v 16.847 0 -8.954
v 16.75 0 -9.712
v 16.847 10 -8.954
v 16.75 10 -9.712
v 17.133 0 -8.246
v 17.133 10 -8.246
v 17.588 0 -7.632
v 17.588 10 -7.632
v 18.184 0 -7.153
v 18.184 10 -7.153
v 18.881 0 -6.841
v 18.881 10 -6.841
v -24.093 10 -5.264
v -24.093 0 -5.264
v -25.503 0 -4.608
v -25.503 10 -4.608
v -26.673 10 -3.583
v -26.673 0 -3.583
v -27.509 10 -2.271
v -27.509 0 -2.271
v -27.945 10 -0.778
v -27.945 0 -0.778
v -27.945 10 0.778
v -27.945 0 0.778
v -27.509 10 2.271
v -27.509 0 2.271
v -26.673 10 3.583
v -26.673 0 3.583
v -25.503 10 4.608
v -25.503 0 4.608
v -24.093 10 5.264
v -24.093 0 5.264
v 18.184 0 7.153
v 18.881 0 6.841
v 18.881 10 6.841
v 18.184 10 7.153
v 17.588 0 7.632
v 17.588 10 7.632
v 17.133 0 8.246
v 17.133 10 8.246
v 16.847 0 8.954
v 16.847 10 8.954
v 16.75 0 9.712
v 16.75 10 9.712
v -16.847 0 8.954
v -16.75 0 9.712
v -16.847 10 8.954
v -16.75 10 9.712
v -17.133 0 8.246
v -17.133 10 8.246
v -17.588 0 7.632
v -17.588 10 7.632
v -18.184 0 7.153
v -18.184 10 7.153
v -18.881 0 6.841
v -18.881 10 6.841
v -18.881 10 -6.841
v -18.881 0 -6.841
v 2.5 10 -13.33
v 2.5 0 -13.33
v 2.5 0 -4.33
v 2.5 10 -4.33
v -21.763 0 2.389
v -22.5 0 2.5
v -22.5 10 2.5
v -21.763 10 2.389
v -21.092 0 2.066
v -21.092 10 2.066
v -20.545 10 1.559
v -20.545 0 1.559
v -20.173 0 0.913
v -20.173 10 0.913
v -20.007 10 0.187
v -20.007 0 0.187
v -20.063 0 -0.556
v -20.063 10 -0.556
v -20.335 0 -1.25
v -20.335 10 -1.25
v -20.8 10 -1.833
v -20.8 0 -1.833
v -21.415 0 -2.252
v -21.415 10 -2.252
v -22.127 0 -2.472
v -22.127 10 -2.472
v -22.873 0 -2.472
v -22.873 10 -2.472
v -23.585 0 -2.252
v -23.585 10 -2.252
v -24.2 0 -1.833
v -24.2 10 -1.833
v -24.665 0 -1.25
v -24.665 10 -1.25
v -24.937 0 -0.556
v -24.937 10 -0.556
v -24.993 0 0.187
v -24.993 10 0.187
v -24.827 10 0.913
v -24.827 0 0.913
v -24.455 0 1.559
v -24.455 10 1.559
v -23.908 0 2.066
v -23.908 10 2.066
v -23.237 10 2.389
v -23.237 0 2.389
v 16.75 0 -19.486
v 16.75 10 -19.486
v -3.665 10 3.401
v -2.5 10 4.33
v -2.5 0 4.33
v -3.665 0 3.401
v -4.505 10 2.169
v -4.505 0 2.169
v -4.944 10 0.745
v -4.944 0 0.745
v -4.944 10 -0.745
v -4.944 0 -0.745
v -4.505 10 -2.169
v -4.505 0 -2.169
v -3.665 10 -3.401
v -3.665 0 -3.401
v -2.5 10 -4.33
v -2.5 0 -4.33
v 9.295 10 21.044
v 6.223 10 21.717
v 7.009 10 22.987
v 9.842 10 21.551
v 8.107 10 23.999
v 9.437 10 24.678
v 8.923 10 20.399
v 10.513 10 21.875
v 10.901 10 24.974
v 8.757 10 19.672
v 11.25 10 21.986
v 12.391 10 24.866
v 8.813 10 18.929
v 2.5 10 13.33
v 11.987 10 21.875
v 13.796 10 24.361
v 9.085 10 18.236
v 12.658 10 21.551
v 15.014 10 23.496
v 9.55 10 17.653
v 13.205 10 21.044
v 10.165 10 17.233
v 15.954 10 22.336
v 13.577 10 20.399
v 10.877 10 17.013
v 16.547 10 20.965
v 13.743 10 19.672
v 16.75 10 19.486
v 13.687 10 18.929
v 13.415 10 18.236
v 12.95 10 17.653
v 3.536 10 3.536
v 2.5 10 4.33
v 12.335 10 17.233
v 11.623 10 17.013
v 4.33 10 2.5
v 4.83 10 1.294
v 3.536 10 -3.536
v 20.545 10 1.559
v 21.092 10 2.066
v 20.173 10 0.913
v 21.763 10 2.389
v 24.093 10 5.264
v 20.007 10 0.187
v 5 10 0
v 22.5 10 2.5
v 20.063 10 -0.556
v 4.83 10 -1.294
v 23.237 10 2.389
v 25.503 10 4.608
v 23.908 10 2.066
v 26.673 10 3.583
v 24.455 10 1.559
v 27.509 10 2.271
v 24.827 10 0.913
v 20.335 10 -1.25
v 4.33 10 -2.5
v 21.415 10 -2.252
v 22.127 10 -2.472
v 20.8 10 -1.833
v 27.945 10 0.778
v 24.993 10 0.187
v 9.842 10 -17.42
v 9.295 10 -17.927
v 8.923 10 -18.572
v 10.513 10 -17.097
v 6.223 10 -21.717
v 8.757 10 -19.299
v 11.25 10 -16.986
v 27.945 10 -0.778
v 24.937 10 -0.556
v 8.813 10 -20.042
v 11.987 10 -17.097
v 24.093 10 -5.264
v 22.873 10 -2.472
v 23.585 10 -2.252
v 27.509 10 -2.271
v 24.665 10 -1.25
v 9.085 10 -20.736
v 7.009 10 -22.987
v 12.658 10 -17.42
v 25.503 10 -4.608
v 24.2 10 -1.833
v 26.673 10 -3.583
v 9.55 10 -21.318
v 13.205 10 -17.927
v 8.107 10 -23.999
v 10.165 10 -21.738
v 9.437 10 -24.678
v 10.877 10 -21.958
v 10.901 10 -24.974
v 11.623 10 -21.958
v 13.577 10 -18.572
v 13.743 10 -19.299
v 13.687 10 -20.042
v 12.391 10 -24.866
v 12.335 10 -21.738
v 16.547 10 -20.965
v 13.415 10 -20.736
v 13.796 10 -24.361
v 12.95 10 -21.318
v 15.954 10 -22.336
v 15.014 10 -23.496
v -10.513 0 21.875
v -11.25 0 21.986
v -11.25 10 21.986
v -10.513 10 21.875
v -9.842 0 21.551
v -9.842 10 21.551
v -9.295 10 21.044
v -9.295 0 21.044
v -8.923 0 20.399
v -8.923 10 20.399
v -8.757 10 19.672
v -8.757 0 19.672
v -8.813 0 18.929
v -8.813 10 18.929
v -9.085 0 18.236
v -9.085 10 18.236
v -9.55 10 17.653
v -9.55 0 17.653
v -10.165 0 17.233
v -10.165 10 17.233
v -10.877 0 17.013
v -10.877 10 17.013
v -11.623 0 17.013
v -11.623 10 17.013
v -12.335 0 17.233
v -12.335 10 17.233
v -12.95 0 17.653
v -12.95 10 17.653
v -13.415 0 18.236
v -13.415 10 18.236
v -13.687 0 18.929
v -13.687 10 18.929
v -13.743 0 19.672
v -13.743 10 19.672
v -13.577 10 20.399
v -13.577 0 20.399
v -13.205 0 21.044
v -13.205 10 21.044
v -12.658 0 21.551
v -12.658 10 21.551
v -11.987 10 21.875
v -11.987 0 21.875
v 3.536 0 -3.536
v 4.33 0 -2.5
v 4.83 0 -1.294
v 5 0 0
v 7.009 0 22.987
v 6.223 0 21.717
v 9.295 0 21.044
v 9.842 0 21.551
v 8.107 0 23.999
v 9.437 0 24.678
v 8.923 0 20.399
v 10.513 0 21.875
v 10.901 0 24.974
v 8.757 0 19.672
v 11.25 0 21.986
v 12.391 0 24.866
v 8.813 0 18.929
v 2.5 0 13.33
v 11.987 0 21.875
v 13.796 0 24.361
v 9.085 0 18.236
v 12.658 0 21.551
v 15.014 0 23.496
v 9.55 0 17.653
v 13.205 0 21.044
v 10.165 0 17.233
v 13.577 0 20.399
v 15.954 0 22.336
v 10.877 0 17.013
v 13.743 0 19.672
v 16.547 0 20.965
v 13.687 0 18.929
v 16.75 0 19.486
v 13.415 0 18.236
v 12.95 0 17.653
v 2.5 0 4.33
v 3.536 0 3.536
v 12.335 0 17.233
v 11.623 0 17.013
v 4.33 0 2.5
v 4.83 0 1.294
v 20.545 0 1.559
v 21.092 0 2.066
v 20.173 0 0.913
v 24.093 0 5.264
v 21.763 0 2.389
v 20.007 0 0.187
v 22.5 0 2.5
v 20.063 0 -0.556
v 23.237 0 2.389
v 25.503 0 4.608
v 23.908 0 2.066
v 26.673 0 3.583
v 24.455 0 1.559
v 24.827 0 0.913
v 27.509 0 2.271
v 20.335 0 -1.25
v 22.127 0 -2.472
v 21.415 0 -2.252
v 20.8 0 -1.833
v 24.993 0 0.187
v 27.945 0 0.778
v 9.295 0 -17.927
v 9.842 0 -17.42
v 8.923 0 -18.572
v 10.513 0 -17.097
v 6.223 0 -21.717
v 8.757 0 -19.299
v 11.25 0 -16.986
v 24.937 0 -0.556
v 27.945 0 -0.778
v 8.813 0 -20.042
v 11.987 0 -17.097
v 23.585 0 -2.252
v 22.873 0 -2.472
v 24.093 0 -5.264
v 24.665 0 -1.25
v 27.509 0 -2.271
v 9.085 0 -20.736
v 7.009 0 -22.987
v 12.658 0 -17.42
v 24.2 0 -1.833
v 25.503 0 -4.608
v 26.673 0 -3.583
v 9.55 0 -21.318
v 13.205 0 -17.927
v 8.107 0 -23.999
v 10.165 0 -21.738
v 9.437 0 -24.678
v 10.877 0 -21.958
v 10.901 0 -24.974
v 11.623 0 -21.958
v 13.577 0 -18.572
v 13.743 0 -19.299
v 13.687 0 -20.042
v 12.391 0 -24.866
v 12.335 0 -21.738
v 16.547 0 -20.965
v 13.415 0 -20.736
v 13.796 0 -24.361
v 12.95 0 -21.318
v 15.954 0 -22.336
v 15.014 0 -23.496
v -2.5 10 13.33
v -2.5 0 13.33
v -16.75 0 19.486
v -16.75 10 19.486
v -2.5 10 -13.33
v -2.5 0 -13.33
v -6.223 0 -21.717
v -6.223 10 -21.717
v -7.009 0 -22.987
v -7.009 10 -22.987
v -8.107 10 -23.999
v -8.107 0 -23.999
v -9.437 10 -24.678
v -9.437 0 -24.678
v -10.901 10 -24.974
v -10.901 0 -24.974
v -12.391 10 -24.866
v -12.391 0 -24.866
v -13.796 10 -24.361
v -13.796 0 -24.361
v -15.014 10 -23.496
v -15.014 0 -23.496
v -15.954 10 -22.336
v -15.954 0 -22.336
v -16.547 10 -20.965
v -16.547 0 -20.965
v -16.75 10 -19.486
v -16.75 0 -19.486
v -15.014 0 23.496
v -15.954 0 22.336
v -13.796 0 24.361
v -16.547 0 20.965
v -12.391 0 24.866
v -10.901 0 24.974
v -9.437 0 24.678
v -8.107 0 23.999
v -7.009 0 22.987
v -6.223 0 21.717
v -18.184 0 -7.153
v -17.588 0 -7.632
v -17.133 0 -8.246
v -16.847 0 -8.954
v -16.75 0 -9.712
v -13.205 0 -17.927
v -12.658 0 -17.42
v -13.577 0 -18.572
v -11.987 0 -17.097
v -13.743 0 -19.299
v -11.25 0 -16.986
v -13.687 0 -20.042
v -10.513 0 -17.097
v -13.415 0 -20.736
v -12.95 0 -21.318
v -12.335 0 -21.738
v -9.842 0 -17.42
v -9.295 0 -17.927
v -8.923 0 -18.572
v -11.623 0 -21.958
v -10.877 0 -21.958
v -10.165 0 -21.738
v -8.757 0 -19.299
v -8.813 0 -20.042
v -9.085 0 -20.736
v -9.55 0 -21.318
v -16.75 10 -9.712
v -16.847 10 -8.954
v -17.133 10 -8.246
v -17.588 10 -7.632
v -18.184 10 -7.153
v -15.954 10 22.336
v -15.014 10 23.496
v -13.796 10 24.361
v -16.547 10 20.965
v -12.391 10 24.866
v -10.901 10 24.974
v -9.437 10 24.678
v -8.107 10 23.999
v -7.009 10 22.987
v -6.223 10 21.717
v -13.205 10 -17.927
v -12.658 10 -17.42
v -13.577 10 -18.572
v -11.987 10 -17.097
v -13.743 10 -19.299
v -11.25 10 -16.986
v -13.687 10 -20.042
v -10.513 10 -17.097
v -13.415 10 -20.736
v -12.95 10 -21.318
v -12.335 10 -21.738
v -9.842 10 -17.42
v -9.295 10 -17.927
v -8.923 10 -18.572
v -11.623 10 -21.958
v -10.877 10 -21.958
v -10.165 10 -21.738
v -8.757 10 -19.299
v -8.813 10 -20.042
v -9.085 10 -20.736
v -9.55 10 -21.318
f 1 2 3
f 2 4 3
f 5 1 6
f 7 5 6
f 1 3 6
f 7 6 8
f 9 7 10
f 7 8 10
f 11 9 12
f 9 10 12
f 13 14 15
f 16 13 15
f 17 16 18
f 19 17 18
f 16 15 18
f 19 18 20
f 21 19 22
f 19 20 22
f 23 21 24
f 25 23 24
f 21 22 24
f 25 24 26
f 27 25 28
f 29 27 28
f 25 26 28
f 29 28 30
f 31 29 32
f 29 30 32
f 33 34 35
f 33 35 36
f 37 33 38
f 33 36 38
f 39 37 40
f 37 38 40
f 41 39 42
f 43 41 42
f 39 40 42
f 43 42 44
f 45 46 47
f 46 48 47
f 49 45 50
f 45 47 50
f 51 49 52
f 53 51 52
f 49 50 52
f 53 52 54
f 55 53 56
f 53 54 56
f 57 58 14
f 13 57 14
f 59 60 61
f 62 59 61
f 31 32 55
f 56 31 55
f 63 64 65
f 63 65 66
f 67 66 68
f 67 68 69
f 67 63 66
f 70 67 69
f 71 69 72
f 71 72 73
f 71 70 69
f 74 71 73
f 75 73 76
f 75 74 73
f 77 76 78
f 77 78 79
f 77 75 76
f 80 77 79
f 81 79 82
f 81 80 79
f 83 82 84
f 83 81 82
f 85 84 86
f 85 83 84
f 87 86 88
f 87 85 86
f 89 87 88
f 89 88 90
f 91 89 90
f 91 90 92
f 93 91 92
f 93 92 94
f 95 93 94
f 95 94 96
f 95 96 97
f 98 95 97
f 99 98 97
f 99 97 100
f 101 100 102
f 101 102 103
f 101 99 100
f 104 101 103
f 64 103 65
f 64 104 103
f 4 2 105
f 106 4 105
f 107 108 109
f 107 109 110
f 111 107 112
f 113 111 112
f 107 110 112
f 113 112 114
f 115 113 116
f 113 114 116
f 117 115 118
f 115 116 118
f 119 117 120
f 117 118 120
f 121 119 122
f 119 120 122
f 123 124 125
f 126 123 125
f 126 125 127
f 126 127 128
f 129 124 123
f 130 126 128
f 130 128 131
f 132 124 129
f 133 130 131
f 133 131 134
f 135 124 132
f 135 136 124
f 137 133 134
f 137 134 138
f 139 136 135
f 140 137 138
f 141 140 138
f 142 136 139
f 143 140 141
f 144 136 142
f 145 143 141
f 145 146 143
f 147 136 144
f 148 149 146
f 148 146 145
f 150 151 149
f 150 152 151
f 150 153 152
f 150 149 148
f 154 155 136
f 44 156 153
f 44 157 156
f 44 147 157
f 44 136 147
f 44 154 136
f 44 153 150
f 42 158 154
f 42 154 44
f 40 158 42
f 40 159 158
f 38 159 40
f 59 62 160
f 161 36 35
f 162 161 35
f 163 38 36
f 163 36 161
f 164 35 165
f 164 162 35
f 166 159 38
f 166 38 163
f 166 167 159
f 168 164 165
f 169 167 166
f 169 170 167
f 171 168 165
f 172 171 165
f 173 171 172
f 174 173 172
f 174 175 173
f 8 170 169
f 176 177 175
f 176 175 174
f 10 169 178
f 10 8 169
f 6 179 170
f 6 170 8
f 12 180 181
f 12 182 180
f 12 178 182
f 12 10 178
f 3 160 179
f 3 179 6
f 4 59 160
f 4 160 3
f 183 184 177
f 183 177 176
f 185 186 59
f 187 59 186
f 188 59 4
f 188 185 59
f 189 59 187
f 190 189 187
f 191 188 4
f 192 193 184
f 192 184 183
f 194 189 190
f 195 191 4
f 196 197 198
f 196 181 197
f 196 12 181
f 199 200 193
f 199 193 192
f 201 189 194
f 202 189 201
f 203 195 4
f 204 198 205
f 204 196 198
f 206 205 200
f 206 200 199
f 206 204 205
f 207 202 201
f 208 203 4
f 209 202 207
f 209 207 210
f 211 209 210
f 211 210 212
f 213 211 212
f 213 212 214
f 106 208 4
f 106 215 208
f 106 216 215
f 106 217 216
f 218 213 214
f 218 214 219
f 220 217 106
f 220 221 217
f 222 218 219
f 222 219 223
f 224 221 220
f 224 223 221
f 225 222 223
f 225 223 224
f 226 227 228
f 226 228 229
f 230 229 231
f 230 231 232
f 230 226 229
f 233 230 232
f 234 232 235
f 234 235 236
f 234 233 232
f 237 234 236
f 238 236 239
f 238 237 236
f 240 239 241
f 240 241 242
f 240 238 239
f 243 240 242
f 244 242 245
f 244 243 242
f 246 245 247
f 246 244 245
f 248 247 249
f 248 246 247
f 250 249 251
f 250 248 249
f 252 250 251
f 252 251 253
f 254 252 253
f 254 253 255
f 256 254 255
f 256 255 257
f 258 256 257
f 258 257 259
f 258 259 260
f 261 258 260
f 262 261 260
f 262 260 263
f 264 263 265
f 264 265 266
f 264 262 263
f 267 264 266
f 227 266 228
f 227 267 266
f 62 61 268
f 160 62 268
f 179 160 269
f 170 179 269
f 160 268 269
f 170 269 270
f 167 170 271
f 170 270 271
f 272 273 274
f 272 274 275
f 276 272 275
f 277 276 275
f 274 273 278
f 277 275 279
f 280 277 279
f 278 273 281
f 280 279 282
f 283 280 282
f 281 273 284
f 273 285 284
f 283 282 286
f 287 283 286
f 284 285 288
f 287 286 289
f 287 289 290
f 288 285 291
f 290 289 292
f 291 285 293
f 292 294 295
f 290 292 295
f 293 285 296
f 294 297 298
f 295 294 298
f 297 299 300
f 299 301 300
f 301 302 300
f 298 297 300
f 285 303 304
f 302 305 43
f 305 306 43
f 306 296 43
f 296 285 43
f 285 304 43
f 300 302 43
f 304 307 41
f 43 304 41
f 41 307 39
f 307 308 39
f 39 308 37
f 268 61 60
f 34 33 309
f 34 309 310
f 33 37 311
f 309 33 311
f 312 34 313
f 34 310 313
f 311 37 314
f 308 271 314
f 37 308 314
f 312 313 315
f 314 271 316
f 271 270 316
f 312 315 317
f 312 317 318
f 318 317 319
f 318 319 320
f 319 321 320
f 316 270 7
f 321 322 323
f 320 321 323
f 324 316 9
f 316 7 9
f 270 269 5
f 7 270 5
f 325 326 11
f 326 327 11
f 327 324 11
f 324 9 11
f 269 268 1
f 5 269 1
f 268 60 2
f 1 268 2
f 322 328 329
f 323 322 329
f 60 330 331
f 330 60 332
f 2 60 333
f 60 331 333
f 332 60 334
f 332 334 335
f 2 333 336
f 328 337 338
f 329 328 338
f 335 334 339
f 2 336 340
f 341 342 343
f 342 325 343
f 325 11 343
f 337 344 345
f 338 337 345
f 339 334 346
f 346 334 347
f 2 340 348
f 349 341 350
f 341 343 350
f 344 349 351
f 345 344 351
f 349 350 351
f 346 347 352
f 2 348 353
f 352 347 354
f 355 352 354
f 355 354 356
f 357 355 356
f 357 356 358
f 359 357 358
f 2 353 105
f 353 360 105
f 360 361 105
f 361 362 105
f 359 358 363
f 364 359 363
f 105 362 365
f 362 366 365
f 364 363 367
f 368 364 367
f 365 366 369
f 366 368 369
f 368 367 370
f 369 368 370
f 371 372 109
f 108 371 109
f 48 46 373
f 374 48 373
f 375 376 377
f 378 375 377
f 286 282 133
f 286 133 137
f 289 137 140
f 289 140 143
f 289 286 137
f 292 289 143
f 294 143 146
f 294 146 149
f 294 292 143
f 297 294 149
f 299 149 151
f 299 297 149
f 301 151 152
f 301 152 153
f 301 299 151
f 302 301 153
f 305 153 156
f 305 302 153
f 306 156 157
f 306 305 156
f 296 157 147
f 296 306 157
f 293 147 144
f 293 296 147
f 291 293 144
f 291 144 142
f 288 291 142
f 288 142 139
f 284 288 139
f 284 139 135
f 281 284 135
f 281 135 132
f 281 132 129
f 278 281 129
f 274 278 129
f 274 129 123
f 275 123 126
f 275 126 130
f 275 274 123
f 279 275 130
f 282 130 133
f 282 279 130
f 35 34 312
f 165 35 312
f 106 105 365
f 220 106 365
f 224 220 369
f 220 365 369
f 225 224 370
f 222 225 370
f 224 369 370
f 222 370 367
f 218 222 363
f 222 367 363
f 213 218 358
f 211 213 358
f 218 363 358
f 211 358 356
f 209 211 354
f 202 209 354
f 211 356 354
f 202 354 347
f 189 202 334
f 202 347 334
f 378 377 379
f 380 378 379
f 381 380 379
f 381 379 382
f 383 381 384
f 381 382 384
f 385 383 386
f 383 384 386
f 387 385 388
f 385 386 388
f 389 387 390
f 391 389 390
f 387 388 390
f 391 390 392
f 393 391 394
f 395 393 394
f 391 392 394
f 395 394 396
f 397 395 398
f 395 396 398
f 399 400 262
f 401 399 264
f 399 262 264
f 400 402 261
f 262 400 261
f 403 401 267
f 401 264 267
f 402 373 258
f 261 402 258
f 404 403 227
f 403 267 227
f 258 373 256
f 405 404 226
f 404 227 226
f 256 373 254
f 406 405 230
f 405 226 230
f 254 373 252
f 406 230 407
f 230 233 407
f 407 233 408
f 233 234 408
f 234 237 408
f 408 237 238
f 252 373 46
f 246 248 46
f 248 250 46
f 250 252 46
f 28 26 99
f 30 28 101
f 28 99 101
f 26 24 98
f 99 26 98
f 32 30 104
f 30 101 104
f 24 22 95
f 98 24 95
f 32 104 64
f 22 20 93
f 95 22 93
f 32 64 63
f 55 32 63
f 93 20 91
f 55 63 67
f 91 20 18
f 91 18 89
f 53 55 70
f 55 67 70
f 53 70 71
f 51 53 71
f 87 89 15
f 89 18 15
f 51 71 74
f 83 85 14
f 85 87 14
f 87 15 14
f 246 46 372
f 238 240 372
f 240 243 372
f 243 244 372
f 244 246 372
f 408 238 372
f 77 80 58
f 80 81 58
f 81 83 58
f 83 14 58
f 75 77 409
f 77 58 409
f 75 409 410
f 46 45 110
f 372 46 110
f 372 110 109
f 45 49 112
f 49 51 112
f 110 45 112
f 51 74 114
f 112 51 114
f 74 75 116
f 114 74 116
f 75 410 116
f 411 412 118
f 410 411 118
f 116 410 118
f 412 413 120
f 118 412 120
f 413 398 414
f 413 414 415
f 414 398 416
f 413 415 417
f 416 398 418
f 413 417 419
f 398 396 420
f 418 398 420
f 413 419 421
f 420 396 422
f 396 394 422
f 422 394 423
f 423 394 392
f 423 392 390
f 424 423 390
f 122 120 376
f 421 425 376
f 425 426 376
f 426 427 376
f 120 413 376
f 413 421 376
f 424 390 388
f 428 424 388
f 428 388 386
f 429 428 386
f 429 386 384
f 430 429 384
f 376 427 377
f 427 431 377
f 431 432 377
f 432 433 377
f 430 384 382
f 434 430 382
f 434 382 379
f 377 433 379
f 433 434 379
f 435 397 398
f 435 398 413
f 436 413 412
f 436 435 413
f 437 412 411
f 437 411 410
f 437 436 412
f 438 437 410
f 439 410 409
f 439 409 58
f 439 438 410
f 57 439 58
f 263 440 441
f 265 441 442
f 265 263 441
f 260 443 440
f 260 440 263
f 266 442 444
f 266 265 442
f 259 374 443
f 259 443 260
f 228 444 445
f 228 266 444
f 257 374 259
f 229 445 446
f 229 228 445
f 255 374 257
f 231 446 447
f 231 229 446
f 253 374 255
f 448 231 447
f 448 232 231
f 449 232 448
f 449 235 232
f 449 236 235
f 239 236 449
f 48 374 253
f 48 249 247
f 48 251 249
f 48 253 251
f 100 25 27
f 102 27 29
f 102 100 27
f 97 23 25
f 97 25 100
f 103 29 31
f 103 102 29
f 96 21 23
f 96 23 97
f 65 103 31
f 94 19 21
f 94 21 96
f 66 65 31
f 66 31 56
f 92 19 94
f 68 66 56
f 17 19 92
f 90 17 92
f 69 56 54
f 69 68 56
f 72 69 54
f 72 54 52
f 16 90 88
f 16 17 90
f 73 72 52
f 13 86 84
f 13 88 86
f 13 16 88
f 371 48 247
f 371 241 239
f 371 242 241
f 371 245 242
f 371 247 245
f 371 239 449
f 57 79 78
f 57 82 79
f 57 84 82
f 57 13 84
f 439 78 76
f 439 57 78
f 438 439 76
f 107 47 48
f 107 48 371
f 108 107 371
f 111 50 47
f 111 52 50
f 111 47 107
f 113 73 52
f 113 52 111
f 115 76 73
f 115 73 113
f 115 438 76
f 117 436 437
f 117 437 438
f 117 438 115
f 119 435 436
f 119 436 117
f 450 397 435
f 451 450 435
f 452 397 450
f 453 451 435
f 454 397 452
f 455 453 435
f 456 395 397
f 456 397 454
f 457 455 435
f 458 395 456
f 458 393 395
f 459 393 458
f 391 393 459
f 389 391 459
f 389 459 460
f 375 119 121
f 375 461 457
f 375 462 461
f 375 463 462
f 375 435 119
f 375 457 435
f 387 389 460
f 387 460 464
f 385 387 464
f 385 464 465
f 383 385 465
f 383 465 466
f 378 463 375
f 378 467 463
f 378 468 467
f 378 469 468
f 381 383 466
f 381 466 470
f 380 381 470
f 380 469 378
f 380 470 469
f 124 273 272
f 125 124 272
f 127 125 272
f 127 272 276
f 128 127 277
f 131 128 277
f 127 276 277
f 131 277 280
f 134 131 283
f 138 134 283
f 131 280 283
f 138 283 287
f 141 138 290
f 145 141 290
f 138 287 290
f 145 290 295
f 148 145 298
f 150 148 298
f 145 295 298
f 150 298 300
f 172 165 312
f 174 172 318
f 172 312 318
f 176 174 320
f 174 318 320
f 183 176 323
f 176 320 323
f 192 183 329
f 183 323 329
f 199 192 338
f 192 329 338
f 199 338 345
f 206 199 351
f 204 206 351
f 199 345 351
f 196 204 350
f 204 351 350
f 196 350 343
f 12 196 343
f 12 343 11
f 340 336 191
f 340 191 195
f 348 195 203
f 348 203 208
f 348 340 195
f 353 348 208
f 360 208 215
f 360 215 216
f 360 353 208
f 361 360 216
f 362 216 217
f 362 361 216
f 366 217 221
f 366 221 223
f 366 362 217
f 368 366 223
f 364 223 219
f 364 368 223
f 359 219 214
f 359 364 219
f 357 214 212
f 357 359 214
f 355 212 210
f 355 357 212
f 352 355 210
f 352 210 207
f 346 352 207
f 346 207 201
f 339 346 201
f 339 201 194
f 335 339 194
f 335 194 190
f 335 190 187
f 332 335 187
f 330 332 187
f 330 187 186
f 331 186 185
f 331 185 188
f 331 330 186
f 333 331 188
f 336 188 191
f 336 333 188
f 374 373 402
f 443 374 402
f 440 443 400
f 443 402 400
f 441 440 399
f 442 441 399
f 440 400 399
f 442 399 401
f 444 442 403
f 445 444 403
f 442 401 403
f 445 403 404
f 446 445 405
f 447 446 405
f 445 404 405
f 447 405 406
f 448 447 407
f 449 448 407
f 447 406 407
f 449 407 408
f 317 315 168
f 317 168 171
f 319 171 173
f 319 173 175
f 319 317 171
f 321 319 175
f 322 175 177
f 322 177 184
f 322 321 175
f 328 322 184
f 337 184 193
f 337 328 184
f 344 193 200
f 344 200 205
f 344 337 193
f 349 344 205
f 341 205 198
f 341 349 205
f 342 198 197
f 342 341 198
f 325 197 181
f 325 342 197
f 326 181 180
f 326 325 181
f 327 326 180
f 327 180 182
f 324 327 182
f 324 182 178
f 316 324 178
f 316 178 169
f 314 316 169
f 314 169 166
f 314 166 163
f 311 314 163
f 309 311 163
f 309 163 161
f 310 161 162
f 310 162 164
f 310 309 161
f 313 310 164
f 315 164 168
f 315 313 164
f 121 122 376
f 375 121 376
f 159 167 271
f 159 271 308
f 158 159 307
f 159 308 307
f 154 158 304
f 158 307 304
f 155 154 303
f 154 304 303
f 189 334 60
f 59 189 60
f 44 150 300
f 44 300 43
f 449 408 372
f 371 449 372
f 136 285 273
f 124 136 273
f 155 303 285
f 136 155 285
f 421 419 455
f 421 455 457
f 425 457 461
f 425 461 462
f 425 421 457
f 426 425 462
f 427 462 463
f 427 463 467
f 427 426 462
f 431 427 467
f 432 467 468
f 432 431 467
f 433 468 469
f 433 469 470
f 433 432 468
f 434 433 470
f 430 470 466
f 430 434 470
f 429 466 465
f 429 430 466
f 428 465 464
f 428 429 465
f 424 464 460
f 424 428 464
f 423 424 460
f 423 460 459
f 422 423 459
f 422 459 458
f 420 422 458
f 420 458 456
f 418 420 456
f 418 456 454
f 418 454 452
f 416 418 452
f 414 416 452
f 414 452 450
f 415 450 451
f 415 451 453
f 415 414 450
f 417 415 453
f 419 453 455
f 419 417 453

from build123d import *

# Parameters (mm, degrees)
SKETCH1_R             = 2.5
BOSS_EXTRUDE1_DEPTH   = 10
BOSS_EXTRUDE1_2_DEPTH = 10
FILLET1_R             = 3
FILLET2_R             = 3


with BuildPart() as part:
    # Sketch1 → Boss-Extrude1 (new body)
    with BuildSketch(Plane(origin=(0, 0, 0), x_dir=(1, 0, 0), z_dir=(0, 1, 0))):
        with BuildLine():
            Line((-2.5, 13.330127019), (-6.223036191, 21.717081134))
            ThreePointArc((-6.223036191, 21.717081134), (-12.390547906, 24.866013061), (-16.75, 19.485571585))
            Line((-16.75, 19.485571585), (-16.75, 7.485571585))
            Line((-16.75, 7.485571585), (-24.092524197, 5.264396137))
            ThreePointArc((-24.092524197, 5.264396137), (-28, 0), (-24.092524197, -5.264396137))
            Line((-24.092524197, -5.264396137), (-16.75, -7.485571585))
            Line((-16.75, -7.485571585), (-16.75, -19.485571585))
            ThreePointArc((-16.75, -19.485571585), (-12.390547906, -24.866013061), (-6.223036191, -21.717081134))
            Line((-6.223036191, -21.717081134), (-2.5, -13.330127019))
            Line((-2.5, -13.330127019), (-2.5, -4.330127019))
            ThreePointArc((-2.5, -4.330127019), (-5, 0), (-2.5, 4.330127019))
            Line((-2.5, 4.330127019), (-2.5, 13.330127019))
        make_face()
        with Locations((-11.25, 19.485571585)):
            Circle(SKETCH1_R, mode=Mode.SUBTRACT)
        with Locations((-11.25, -19.485571585)):
            Circle(SKETCH1_R, mode=Mode.SUBTRACT)
        with Locations((-22.5, 0)):
            Circle(SKETCH1_R, mode=Mode.SUBTRACT)
    extrude(amount=BOSS_EXTRUDE1_DEPTH)

    # Fillet1
    fillet1_edges = [part.edges().sort_by_distance(p)[0] for p in [
        (-16.75, 5, 7.485571585),
        (-16.75, 5, -7.485571585),
    ]]
    fillet(fillet1_edges, radius=FILLET1_R)


with BuildPart() as body_2:
    # Sketch1 → Boss-Extrude1 2 (new body)
    with BuildSketch(Plane(origin=(0, 0, 0), x_dir=(1, 0, 0), z_dir=(0, 1, 0))):
        with BuildLine():
            Line((2.5, 13.330127019), (2.5, 4.330127019))
            ThreePointArc((2.5, 4.330127019), (5, 0), (2.5, -4.330127019))
            Line((2.5, -4.330127019), (2.5, -13.330127019))
            Line((2.5, -13.330127019), (6.223036191, -21.717081134))
            ThreePointArc((6.223036191, -21.717081134), (12.390547906, -24.866013061), (16.75, -19.485571585))
            Line((16.75, -19.485571585), (16.75, -7.485571585))
            Line((16.75, -7.485571585), (24.092524197, -5.264396137))
            ThreePointArc((24.092524197, -5.264396137), (28, 0), (24.092524197, 5.264396137))
            Line((24.092524197, 5.264396137), (16.75, 7.485571585))
            Line((16.75, 7.485571585), (16.75, 19.485571585))
            ThreePointArc((16.75, 19.485571585), (12.390547906, 24.866013061), (6.223036191, 21.717081134))
            Line((6.223036191, 21.717081134), (2.5, 13.330127019))
        make_face()
        with Locations((11.25, 19.485571585)):
            Circle(SKETCH1_R, mode=Mode.SUBTRACT)
        with Locations((11.25, -19.485571585)):
            Circle(SKETCH1_R, mode=Mode.SUBTRACT)
        with Locations((22.5, 0)):
            Circle(SKETCH1_R, mode=Mode.SUBTRACT)
    extrude(amount=BOSS_EXTRUDE1_2_DEPTH)

    # Fillet2
    fillet2_edges = [body_2.edges().sort_by_distance(p)[0] for p in [
        (16.75, 5, 7.485571585),
        (16.75, 5, -7.485571585),
    ]]
    fillet(fillet2_edges, radius=FILLET2_R)


solid = Compound([part.part, body_2.part])
